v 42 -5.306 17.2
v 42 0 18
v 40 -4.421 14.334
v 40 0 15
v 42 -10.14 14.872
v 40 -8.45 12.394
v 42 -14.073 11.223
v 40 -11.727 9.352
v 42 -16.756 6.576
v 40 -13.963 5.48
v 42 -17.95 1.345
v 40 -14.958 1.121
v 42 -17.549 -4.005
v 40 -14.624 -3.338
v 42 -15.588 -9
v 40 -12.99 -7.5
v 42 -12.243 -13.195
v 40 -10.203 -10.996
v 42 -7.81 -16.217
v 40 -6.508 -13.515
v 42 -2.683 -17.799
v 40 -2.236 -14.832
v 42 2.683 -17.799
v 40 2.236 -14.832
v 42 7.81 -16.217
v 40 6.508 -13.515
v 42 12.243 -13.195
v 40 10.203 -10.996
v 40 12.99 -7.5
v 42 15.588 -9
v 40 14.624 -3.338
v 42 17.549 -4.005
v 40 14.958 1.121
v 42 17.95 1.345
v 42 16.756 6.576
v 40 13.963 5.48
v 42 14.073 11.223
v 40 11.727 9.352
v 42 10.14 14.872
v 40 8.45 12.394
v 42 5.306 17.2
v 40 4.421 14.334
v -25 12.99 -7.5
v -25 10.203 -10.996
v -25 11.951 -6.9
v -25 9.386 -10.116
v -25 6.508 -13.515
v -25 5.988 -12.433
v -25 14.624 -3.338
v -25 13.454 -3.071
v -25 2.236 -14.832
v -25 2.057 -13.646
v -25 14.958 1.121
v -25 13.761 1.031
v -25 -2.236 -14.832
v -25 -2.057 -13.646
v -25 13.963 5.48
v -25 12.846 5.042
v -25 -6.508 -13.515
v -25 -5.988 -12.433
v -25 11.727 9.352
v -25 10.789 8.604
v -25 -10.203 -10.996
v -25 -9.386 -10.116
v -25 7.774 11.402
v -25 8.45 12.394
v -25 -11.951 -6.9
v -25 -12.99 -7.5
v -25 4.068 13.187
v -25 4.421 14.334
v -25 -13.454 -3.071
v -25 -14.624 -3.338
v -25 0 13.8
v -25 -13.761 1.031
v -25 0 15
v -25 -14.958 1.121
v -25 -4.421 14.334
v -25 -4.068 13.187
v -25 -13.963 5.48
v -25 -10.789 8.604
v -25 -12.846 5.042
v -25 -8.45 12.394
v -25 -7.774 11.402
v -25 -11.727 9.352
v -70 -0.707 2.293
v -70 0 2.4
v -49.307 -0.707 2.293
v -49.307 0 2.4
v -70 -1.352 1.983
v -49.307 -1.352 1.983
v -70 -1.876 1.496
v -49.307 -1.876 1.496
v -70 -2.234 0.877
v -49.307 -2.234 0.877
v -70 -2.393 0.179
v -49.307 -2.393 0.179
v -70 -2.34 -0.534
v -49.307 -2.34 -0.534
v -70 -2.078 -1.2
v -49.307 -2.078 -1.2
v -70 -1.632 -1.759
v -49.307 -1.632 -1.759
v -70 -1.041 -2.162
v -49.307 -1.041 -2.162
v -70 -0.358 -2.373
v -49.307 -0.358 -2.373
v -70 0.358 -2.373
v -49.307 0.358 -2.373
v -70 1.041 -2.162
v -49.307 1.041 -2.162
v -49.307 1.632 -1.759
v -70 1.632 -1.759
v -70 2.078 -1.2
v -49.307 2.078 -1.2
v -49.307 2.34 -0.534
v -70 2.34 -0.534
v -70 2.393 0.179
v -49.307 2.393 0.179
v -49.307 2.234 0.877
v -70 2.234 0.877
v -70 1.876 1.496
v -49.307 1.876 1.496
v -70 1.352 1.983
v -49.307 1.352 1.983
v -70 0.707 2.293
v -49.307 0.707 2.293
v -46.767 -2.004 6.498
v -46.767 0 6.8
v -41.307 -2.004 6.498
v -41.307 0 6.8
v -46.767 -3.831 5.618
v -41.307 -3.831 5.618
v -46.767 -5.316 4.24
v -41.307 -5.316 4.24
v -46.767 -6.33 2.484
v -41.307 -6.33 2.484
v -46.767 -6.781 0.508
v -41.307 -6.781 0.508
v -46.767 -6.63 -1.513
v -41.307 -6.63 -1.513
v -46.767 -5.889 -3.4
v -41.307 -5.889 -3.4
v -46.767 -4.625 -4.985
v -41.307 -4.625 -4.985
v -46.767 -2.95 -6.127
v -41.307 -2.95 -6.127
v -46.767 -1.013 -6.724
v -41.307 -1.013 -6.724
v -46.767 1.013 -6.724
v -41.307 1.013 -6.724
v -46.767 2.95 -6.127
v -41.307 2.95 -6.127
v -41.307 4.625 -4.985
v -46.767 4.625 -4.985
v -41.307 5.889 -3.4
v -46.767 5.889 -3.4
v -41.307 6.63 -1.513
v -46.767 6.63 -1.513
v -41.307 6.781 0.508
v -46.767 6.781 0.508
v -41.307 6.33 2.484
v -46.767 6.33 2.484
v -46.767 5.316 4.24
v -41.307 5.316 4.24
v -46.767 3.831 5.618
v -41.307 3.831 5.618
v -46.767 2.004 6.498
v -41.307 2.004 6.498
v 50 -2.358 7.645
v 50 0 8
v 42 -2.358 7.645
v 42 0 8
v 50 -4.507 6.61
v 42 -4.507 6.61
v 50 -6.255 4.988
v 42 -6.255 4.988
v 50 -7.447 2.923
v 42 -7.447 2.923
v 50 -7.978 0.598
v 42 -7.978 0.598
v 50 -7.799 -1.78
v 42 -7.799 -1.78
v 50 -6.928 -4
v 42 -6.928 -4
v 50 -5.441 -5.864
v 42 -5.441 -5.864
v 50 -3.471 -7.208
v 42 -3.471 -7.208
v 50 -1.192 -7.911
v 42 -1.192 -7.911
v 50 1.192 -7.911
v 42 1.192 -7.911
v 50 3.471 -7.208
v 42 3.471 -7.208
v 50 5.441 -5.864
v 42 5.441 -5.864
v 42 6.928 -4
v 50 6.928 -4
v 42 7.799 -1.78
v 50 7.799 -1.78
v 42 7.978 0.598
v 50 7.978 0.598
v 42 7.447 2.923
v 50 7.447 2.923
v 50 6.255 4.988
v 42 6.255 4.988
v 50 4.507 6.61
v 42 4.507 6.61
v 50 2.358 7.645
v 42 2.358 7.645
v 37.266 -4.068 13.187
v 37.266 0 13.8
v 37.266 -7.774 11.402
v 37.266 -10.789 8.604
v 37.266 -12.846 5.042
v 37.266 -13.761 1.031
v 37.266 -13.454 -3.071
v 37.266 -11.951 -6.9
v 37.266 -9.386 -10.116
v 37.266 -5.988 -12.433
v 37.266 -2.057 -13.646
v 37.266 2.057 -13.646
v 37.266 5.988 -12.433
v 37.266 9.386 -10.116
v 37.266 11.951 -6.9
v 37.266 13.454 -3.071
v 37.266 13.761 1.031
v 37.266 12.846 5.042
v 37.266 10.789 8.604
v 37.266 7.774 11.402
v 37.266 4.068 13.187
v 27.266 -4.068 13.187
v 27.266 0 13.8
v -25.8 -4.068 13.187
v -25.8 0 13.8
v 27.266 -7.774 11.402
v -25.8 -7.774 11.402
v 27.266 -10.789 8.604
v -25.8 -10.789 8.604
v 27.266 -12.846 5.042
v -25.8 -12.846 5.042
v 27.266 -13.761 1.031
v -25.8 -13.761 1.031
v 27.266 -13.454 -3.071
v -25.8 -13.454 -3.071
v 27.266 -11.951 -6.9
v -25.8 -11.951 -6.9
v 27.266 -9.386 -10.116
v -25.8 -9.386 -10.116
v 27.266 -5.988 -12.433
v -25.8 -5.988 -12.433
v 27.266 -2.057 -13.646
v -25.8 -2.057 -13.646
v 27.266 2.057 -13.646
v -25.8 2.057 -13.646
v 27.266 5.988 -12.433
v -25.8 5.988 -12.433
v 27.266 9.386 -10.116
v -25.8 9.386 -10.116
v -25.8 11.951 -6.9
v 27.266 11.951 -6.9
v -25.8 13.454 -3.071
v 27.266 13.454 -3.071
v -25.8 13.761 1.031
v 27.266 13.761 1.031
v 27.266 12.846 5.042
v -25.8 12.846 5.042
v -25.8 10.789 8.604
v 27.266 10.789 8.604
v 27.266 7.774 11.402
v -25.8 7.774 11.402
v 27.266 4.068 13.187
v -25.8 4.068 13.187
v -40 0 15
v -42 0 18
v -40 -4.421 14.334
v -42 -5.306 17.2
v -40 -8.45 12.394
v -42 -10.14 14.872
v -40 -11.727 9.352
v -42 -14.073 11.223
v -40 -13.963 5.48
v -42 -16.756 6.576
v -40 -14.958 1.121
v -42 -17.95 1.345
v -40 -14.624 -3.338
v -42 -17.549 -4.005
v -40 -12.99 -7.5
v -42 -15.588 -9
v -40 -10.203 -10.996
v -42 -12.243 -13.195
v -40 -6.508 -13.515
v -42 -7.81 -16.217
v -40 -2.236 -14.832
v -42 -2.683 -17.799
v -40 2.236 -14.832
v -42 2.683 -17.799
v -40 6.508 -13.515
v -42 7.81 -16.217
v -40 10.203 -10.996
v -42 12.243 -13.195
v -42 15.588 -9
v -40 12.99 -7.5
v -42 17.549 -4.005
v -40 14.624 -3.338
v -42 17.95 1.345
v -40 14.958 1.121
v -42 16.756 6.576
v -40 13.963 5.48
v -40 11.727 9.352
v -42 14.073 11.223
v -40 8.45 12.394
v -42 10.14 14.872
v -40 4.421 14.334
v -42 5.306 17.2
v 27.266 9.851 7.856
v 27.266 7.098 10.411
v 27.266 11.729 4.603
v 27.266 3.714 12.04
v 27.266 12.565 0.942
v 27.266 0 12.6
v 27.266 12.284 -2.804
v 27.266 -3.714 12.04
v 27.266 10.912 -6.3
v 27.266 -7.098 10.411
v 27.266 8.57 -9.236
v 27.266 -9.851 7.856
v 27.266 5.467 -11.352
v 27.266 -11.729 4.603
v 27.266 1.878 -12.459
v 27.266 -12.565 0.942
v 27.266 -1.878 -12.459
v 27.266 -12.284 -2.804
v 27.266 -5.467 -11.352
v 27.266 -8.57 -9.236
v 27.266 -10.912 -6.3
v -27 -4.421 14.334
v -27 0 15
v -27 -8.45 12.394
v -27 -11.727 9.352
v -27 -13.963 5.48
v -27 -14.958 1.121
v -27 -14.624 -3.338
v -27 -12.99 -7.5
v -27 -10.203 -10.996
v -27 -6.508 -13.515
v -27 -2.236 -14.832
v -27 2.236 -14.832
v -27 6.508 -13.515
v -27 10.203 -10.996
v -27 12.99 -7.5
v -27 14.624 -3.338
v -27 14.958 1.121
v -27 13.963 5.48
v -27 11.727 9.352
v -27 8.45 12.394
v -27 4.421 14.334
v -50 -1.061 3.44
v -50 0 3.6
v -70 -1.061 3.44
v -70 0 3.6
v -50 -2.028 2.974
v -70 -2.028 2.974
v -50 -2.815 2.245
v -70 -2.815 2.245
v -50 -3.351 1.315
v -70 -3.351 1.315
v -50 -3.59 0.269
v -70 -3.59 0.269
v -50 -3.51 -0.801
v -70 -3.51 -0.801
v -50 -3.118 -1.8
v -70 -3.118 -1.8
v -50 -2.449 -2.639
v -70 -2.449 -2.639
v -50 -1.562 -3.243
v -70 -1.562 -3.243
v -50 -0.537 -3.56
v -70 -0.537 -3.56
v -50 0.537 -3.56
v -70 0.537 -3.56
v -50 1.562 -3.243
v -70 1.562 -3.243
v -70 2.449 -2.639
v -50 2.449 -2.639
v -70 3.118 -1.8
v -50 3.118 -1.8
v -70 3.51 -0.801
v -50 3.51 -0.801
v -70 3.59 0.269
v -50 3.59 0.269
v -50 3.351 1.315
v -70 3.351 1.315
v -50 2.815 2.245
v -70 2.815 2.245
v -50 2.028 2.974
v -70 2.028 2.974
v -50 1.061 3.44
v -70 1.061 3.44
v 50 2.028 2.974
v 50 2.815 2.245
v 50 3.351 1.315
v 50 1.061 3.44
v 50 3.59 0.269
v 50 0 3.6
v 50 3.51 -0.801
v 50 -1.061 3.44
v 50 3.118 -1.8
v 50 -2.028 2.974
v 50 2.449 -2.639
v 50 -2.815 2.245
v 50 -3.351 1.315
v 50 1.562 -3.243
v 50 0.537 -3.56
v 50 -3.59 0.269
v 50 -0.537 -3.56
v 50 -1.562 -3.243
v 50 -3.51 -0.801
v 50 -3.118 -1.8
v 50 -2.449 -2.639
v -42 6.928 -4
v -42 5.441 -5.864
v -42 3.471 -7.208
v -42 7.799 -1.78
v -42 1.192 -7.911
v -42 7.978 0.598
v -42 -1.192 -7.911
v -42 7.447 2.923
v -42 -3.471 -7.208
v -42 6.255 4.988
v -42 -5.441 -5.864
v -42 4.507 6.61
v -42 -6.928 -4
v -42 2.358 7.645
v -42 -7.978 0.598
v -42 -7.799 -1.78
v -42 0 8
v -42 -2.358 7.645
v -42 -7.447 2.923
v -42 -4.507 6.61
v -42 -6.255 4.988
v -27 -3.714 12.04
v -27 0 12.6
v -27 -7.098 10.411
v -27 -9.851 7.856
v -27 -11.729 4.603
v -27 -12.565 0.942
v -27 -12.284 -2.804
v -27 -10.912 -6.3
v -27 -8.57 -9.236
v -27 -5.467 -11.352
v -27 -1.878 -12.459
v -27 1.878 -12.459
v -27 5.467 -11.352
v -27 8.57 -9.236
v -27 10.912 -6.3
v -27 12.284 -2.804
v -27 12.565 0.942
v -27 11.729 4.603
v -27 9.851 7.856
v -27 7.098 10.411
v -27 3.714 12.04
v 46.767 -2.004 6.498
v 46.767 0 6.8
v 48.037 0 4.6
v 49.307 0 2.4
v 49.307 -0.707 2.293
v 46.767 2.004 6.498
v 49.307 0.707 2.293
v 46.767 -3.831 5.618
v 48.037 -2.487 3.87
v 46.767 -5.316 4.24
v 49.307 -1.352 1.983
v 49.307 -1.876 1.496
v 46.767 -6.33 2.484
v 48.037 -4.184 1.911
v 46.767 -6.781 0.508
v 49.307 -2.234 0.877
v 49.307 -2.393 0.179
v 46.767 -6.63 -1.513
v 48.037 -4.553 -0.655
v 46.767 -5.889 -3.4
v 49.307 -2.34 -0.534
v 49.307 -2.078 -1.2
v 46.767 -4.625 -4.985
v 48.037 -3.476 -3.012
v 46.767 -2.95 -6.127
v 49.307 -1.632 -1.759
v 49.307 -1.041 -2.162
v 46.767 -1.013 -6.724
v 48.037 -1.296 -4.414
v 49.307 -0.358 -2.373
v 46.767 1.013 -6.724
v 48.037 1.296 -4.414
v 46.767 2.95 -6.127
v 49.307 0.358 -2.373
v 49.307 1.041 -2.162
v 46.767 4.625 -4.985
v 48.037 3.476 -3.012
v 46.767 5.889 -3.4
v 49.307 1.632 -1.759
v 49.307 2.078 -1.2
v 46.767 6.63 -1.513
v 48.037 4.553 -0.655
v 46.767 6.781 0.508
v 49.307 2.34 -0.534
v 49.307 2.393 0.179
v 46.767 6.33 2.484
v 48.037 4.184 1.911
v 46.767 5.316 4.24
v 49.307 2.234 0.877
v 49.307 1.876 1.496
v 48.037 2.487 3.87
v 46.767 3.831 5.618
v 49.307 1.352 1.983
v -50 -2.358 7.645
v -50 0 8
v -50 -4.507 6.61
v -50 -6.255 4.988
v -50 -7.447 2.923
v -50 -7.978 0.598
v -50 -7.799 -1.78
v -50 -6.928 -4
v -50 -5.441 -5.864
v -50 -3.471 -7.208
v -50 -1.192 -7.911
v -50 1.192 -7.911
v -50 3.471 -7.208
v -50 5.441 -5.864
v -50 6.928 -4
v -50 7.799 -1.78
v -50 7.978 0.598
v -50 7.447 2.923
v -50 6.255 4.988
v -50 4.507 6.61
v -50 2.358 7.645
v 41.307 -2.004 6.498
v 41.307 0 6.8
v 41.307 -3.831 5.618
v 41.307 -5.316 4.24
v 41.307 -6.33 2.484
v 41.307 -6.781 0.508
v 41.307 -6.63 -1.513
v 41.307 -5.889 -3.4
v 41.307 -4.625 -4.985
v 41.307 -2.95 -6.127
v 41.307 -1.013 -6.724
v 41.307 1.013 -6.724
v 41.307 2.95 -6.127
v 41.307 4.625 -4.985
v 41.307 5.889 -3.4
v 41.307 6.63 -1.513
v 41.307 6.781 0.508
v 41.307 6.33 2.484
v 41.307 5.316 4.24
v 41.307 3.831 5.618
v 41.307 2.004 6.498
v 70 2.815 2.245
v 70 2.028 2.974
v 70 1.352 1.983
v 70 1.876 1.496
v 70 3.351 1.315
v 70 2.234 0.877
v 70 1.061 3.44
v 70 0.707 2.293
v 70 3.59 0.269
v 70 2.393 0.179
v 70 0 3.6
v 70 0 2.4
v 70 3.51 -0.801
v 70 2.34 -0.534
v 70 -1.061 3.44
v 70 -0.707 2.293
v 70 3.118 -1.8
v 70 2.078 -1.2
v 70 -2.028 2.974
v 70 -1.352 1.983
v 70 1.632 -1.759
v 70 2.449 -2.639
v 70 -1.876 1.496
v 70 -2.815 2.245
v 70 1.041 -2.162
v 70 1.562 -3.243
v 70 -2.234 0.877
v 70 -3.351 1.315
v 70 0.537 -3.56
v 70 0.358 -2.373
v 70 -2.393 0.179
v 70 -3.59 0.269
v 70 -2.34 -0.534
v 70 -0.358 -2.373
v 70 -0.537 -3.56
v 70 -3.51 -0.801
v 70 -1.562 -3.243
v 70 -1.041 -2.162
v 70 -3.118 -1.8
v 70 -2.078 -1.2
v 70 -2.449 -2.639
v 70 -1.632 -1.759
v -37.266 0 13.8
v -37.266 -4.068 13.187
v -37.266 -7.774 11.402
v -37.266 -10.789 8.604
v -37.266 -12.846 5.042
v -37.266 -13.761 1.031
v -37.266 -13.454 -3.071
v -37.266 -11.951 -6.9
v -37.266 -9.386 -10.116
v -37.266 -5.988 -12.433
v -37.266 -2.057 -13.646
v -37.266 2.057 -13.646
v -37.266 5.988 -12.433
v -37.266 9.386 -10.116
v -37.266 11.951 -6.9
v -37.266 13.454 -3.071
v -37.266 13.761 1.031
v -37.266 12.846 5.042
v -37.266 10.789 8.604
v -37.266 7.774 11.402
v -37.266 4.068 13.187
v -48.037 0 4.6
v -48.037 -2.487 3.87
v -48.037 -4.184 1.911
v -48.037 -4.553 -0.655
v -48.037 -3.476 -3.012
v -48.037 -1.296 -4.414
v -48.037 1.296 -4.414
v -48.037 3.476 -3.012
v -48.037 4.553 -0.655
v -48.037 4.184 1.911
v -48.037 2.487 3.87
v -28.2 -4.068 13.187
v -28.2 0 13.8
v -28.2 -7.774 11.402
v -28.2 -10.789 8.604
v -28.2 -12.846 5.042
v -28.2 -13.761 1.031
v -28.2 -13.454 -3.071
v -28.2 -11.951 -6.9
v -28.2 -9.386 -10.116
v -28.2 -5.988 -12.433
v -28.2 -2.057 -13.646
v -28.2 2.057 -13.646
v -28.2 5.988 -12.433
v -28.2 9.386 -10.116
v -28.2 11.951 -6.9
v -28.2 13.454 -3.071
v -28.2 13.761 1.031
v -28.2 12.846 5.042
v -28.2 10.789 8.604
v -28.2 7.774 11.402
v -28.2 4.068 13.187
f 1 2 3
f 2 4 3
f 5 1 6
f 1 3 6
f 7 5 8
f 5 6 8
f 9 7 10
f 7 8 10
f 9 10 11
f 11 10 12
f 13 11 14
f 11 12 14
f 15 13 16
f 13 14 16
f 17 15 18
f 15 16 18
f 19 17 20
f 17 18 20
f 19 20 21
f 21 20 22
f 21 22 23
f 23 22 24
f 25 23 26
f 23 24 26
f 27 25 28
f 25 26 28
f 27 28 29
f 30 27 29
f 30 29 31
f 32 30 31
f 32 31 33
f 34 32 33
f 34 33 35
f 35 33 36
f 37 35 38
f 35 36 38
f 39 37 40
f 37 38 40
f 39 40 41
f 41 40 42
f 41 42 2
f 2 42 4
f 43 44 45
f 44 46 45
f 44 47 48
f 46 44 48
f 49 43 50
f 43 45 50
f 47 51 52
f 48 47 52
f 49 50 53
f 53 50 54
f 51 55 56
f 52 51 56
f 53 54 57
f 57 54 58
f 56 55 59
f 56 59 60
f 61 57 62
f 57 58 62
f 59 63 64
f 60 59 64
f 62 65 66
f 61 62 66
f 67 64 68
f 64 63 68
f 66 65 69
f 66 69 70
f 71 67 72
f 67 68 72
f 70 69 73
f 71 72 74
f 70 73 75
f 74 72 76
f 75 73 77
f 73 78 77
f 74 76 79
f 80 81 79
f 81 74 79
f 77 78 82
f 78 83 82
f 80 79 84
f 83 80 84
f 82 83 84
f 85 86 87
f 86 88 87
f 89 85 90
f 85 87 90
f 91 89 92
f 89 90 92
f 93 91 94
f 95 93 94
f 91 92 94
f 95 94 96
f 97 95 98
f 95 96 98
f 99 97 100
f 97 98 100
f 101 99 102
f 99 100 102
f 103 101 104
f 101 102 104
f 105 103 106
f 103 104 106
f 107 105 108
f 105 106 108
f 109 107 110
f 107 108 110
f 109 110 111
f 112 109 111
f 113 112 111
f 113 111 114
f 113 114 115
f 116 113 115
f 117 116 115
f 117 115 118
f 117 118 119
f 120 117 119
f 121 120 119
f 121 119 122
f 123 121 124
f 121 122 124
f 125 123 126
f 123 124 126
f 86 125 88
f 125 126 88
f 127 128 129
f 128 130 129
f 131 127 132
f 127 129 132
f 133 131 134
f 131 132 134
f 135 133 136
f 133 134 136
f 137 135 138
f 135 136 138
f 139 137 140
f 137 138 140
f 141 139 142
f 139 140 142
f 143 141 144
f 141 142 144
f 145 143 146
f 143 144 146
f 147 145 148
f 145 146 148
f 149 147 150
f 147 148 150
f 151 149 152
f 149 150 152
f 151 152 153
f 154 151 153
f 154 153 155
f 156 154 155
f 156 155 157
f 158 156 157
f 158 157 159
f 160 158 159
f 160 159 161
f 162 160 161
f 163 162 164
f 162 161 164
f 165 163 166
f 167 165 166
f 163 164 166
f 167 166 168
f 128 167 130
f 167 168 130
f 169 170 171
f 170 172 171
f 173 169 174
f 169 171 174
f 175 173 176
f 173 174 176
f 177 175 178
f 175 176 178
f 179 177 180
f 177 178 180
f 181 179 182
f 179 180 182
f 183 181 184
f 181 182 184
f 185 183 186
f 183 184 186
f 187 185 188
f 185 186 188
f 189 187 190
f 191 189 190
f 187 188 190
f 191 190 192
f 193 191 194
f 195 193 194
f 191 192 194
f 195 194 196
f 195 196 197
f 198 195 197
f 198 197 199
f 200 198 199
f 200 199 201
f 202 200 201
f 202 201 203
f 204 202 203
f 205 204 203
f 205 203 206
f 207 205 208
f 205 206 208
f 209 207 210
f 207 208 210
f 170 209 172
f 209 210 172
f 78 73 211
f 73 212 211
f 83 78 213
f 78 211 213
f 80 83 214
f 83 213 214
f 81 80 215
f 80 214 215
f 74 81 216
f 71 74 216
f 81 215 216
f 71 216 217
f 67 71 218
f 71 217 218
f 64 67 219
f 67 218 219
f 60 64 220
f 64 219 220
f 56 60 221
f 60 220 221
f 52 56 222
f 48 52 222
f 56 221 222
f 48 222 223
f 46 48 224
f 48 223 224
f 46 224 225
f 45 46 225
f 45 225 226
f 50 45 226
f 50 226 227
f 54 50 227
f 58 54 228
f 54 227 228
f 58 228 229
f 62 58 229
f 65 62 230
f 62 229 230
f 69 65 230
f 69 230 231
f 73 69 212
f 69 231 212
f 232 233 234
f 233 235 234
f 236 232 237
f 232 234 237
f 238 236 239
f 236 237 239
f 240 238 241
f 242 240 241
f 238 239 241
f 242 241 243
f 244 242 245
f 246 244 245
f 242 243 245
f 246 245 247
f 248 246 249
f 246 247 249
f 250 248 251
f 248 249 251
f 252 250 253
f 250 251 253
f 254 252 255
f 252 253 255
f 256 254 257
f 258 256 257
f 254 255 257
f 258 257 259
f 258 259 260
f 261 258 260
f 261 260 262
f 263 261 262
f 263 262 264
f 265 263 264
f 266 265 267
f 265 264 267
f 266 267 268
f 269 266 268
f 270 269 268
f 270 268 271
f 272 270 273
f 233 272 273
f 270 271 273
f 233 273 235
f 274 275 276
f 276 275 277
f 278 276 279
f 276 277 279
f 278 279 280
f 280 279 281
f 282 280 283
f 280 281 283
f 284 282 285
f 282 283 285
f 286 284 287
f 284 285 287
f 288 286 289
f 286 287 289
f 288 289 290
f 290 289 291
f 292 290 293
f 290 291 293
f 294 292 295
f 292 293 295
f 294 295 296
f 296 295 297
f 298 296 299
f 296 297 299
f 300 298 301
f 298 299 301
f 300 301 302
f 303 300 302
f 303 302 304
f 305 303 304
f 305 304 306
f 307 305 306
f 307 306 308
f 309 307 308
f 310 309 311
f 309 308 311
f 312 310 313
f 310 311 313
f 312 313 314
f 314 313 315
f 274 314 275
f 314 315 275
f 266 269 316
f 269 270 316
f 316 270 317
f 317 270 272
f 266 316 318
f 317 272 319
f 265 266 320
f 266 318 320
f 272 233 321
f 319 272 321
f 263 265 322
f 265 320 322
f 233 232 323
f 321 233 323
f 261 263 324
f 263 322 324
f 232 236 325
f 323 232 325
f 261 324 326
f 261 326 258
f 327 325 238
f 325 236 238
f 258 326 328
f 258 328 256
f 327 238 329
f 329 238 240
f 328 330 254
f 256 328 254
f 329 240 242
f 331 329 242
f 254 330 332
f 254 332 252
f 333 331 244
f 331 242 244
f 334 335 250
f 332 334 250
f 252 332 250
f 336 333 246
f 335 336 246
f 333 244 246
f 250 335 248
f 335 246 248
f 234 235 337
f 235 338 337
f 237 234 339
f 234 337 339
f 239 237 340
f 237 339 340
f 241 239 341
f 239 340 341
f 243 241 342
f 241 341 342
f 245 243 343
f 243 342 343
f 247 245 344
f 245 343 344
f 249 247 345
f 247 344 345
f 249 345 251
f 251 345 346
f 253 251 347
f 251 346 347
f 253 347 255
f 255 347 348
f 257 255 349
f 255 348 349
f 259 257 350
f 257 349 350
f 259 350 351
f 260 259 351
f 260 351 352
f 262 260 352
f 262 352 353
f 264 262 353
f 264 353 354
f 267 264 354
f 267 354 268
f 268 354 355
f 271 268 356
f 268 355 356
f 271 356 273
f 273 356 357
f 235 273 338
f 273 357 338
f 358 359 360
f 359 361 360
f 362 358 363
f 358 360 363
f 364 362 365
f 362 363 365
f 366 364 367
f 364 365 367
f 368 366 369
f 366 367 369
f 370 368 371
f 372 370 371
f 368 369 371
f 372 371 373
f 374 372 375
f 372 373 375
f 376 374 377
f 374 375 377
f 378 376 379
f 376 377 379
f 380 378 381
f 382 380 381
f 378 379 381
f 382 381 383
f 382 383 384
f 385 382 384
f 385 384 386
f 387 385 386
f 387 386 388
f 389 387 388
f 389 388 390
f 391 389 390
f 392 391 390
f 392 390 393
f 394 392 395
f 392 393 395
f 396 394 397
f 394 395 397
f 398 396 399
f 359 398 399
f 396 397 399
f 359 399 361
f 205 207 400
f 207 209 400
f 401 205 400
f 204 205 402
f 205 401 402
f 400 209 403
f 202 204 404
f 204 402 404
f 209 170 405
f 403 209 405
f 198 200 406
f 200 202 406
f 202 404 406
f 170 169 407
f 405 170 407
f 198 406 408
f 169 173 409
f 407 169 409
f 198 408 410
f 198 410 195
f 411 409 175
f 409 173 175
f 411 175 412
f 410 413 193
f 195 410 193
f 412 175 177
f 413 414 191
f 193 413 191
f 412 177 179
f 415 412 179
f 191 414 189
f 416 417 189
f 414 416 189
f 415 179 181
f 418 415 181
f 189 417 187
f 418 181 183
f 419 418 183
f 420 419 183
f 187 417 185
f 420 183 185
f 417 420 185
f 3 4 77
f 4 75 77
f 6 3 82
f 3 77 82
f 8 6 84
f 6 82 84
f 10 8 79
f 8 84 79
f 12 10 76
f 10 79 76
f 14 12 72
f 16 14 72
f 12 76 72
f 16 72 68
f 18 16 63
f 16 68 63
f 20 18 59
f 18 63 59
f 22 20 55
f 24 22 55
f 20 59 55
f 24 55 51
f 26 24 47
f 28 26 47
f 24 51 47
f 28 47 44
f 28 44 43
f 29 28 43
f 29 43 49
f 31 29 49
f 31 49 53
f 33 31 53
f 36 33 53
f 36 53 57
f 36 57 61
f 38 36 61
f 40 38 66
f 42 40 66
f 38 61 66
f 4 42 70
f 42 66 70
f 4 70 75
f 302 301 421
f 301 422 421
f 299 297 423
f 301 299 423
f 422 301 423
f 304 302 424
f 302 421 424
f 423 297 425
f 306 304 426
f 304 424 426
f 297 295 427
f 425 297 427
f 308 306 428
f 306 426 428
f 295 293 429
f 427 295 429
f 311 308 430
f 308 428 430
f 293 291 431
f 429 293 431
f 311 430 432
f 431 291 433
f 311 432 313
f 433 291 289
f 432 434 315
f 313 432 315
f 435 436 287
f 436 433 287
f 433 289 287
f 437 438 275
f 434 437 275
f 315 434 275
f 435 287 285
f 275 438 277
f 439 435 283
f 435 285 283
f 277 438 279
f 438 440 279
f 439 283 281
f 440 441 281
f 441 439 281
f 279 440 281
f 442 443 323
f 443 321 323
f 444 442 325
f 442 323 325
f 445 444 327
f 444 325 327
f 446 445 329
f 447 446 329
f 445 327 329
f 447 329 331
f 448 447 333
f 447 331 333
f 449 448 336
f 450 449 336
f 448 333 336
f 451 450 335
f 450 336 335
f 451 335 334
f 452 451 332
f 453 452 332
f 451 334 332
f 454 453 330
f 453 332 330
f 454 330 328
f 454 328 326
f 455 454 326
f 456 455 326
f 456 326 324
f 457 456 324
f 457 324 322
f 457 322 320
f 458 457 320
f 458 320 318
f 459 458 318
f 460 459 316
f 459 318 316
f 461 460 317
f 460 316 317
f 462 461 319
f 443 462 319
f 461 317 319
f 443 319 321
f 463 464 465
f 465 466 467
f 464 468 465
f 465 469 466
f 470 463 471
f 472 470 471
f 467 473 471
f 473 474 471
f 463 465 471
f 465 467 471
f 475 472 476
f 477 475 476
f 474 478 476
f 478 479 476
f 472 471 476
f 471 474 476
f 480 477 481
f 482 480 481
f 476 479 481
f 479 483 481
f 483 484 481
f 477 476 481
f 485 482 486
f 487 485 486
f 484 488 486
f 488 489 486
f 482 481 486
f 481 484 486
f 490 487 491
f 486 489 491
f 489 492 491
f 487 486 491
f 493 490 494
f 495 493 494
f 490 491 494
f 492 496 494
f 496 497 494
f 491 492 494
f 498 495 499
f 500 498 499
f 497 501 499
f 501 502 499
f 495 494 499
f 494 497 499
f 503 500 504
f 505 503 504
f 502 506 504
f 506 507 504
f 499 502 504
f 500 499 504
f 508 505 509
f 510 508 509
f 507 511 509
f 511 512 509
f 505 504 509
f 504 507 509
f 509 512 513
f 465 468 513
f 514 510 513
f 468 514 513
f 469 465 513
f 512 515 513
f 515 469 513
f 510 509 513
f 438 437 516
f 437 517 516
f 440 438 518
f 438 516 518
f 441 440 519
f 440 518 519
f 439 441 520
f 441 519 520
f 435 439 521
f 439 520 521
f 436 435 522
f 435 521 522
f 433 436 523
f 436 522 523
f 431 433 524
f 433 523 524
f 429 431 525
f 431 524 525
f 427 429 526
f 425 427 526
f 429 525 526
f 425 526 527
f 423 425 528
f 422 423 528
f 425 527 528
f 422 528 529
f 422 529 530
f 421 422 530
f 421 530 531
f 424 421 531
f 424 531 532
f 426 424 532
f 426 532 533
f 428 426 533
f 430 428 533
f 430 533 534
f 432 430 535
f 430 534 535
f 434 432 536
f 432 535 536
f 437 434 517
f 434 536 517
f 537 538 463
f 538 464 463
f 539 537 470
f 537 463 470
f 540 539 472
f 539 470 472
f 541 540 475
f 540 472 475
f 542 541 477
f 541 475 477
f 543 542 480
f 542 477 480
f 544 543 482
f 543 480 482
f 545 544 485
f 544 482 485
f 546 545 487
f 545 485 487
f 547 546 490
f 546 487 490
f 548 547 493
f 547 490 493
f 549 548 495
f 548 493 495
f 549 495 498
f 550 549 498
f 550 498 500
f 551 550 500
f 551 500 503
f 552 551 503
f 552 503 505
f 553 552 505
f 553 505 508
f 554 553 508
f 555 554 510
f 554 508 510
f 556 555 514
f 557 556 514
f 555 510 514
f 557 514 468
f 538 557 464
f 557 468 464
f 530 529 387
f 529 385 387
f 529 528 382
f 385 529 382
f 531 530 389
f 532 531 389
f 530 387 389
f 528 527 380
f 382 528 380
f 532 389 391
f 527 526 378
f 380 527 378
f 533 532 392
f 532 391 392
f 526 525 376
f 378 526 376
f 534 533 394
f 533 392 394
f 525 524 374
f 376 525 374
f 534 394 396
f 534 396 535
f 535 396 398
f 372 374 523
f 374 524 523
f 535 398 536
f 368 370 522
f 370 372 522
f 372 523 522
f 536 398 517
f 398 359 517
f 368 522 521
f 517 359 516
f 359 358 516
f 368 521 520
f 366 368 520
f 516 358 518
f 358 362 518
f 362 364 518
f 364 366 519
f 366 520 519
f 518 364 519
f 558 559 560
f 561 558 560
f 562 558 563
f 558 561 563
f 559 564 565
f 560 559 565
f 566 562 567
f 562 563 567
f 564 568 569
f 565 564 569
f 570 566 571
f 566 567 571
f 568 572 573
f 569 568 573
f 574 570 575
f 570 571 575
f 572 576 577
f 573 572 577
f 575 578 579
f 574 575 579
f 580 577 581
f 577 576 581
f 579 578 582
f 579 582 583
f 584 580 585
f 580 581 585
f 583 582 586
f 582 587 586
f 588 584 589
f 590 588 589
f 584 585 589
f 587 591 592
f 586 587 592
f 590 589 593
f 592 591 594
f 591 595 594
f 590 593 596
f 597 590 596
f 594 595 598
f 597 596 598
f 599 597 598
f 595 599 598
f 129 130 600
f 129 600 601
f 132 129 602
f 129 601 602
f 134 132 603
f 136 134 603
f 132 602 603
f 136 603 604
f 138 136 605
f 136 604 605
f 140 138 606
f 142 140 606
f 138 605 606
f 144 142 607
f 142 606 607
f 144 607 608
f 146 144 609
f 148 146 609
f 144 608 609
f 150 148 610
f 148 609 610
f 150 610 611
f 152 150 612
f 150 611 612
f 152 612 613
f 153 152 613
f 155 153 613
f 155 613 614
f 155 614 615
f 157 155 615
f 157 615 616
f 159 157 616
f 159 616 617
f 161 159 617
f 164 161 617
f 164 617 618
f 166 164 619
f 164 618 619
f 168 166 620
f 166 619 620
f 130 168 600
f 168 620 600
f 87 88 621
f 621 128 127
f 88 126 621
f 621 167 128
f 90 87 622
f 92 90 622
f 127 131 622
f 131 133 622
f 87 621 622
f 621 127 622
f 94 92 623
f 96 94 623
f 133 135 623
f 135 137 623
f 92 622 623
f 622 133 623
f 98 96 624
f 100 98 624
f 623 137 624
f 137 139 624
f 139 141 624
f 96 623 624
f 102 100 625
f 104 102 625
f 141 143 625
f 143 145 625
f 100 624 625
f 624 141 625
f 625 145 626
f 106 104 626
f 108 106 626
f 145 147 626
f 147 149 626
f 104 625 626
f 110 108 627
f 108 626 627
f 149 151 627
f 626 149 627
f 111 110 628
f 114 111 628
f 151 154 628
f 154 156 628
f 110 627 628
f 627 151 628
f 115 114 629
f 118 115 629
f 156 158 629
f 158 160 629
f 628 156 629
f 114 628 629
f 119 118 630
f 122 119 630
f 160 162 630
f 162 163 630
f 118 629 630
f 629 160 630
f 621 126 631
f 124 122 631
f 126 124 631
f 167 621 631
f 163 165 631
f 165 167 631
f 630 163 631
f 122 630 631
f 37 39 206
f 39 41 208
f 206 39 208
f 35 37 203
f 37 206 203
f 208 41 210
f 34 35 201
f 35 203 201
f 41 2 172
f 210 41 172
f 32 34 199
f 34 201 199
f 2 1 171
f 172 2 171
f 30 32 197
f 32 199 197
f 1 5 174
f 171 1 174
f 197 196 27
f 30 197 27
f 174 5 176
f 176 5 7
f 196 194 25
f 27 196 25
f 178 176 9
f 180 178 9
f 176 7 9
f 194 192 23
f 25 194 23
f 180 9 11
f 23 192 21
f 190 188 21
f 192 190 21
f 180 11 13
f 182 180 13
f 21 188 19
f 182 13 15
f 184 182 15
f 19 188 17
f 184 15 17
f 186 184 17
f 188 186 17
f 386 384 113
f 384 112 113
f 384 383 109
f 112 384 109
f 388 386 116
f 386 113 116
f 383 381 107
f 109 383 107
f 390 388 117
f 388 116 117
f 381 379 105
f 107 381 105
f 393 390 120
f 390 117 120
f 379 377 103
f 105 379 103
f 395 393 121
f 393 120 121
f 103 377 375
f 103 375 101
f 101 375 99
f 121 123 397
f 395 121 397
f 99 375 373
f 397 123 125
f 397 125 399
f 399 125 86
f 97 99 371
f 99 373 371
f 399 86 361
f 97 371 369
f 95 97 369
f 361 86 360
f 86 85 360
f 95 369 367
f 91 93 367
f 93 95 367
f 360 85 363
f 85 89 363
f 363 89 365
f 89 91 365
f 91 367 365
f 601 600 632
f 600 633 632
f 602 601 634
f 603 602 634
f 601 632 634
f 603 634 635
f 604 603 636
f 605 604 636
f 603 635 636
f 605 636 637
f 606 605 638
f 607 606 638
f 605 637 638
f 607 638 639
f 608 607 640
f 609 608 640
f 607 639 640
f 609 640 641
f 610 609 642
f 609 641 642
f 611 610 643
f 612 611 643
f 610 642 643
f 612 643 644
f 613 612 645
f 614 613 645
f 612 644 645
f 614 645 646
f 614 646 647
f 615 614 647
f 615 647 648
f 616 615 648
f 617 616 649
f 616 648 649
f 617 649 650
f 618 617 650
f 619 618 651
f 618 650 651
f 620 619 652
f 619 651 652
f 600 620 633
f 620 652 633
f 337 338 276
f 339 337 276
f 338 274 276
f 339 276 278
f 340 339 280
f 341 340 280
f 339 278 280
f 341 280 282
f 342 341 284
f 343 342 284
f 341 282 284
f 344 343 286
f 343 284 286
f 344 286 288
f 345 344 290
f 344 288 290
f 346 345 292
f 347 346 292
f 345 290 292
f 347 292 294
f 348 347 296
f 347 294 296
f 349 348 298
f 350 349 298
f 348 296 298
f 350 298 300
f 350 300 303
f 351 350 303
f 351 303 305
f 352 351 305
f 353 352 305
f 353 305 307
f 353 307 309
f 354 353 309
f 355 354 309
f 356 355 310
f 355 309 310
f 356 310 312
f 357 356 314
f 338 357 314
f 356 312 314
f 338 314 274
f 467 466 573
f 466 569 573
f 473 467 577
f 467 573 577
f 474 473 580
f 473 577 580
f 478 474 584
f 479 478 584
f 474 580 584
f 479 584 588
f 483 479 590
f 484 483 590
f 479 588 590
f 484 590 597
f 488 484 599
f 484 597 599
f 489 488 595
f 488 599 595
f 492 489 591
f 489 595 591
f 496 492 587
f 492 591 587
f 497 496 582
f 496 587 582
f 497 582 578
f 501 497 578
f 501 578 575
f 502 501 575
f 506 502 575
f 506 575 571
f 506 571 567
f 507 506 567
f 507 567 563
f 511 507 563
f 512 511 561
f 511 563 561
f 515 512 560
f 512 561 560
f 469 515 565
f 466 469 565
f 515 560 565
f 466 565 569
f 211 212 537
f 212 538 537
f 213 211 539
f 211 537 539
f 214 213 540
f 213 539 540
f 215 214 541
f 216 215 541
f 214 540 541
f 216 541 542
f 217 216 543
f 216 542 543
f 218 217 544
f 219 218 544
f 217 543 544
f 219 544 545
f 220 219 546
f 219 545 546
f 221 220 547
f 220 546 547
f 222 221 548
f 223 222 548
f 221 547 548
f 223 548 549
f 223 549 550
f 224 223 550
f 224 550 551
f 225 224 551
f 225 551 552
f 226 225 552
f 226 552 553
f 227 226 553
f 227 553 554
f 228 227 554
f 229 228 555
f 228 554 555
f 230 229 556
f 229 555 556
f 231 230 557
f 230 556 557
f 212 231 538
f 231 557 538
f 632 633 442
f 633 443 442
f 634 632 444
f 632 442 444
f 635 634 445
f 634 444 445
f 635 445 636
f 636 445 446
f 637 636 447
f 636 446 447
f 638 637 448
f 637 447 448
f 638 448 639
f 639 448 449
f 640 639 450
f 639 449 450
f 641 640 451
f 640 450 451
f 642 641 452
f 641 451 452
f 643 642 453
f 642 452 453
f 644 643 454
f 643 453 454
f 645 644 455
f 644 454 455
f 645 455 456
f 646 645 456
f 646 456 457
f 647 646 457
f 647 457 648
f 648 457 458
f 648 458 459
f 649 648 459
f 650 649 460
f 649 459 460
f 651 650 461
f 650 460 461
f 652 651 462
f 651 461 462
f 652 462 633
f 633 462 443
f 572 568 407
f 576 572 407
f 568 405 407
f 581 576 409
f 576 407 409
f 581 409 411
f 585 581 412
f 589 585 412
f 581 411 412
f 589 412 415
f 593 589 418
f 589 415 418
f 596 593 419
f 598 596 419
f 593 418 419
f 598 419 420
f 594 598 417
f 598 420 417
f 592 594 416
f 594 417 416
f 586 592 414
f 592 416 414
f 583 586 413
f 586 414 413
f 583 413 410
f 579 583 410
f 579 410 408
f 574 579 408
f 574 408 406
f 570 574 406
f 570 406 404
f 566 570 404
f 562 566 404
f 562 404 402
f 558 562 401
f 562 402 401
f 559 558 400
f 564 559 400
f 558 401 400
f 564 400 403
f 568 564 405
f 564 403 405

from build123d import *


with BuildPart() as f1:
    # F0 (on Front) → F1 (revolve)
    with BuildSketch(Plane.XZ):
        Polygon((70, 2.4), (70, 3.6), (50, 3.6), (50, 8), (42, 8), (42, 18), (40, 15), (-25, 15), (-25, 13.8), (37.265728, 13.8), (41.30718, 6.8), (46.766838, 6.8), (49.30718, 2.4), align=None)
    revolve(axis=Axis((37.433878, 0, 0), (1, 0, 0)))


with BuildPart() as f3:
    # F2 (on Front) → F3 (revolve)
    with BuildSketch(Plane.XZ):
        Polygon((-27, 15), (-40, 15), (-42, 18), (-42, 8), (-50, 8), (-50, 3.6), (-70, 3.6), (-70, 2.4), (-49.30718, 2.4), (-46.766838, 6.8), (-41.30718, 6.8), (-37.265728, 13.8), (-28.2, 13.8), align=None)
        Polygon((-25.8, 13.8), (-27, 15), (-28.2, 13.8), (-27, 12.6), align=None)
        Polygon((27.265728, 13.8), (-25.8, 13.8), (-27, 12.6), (27.265728, 12.6), align=None)
    revolve(axis=Axis((37.433878, 0, 0), (1, 0, 0)))


solid = Compound([f1.part, f3.part])
